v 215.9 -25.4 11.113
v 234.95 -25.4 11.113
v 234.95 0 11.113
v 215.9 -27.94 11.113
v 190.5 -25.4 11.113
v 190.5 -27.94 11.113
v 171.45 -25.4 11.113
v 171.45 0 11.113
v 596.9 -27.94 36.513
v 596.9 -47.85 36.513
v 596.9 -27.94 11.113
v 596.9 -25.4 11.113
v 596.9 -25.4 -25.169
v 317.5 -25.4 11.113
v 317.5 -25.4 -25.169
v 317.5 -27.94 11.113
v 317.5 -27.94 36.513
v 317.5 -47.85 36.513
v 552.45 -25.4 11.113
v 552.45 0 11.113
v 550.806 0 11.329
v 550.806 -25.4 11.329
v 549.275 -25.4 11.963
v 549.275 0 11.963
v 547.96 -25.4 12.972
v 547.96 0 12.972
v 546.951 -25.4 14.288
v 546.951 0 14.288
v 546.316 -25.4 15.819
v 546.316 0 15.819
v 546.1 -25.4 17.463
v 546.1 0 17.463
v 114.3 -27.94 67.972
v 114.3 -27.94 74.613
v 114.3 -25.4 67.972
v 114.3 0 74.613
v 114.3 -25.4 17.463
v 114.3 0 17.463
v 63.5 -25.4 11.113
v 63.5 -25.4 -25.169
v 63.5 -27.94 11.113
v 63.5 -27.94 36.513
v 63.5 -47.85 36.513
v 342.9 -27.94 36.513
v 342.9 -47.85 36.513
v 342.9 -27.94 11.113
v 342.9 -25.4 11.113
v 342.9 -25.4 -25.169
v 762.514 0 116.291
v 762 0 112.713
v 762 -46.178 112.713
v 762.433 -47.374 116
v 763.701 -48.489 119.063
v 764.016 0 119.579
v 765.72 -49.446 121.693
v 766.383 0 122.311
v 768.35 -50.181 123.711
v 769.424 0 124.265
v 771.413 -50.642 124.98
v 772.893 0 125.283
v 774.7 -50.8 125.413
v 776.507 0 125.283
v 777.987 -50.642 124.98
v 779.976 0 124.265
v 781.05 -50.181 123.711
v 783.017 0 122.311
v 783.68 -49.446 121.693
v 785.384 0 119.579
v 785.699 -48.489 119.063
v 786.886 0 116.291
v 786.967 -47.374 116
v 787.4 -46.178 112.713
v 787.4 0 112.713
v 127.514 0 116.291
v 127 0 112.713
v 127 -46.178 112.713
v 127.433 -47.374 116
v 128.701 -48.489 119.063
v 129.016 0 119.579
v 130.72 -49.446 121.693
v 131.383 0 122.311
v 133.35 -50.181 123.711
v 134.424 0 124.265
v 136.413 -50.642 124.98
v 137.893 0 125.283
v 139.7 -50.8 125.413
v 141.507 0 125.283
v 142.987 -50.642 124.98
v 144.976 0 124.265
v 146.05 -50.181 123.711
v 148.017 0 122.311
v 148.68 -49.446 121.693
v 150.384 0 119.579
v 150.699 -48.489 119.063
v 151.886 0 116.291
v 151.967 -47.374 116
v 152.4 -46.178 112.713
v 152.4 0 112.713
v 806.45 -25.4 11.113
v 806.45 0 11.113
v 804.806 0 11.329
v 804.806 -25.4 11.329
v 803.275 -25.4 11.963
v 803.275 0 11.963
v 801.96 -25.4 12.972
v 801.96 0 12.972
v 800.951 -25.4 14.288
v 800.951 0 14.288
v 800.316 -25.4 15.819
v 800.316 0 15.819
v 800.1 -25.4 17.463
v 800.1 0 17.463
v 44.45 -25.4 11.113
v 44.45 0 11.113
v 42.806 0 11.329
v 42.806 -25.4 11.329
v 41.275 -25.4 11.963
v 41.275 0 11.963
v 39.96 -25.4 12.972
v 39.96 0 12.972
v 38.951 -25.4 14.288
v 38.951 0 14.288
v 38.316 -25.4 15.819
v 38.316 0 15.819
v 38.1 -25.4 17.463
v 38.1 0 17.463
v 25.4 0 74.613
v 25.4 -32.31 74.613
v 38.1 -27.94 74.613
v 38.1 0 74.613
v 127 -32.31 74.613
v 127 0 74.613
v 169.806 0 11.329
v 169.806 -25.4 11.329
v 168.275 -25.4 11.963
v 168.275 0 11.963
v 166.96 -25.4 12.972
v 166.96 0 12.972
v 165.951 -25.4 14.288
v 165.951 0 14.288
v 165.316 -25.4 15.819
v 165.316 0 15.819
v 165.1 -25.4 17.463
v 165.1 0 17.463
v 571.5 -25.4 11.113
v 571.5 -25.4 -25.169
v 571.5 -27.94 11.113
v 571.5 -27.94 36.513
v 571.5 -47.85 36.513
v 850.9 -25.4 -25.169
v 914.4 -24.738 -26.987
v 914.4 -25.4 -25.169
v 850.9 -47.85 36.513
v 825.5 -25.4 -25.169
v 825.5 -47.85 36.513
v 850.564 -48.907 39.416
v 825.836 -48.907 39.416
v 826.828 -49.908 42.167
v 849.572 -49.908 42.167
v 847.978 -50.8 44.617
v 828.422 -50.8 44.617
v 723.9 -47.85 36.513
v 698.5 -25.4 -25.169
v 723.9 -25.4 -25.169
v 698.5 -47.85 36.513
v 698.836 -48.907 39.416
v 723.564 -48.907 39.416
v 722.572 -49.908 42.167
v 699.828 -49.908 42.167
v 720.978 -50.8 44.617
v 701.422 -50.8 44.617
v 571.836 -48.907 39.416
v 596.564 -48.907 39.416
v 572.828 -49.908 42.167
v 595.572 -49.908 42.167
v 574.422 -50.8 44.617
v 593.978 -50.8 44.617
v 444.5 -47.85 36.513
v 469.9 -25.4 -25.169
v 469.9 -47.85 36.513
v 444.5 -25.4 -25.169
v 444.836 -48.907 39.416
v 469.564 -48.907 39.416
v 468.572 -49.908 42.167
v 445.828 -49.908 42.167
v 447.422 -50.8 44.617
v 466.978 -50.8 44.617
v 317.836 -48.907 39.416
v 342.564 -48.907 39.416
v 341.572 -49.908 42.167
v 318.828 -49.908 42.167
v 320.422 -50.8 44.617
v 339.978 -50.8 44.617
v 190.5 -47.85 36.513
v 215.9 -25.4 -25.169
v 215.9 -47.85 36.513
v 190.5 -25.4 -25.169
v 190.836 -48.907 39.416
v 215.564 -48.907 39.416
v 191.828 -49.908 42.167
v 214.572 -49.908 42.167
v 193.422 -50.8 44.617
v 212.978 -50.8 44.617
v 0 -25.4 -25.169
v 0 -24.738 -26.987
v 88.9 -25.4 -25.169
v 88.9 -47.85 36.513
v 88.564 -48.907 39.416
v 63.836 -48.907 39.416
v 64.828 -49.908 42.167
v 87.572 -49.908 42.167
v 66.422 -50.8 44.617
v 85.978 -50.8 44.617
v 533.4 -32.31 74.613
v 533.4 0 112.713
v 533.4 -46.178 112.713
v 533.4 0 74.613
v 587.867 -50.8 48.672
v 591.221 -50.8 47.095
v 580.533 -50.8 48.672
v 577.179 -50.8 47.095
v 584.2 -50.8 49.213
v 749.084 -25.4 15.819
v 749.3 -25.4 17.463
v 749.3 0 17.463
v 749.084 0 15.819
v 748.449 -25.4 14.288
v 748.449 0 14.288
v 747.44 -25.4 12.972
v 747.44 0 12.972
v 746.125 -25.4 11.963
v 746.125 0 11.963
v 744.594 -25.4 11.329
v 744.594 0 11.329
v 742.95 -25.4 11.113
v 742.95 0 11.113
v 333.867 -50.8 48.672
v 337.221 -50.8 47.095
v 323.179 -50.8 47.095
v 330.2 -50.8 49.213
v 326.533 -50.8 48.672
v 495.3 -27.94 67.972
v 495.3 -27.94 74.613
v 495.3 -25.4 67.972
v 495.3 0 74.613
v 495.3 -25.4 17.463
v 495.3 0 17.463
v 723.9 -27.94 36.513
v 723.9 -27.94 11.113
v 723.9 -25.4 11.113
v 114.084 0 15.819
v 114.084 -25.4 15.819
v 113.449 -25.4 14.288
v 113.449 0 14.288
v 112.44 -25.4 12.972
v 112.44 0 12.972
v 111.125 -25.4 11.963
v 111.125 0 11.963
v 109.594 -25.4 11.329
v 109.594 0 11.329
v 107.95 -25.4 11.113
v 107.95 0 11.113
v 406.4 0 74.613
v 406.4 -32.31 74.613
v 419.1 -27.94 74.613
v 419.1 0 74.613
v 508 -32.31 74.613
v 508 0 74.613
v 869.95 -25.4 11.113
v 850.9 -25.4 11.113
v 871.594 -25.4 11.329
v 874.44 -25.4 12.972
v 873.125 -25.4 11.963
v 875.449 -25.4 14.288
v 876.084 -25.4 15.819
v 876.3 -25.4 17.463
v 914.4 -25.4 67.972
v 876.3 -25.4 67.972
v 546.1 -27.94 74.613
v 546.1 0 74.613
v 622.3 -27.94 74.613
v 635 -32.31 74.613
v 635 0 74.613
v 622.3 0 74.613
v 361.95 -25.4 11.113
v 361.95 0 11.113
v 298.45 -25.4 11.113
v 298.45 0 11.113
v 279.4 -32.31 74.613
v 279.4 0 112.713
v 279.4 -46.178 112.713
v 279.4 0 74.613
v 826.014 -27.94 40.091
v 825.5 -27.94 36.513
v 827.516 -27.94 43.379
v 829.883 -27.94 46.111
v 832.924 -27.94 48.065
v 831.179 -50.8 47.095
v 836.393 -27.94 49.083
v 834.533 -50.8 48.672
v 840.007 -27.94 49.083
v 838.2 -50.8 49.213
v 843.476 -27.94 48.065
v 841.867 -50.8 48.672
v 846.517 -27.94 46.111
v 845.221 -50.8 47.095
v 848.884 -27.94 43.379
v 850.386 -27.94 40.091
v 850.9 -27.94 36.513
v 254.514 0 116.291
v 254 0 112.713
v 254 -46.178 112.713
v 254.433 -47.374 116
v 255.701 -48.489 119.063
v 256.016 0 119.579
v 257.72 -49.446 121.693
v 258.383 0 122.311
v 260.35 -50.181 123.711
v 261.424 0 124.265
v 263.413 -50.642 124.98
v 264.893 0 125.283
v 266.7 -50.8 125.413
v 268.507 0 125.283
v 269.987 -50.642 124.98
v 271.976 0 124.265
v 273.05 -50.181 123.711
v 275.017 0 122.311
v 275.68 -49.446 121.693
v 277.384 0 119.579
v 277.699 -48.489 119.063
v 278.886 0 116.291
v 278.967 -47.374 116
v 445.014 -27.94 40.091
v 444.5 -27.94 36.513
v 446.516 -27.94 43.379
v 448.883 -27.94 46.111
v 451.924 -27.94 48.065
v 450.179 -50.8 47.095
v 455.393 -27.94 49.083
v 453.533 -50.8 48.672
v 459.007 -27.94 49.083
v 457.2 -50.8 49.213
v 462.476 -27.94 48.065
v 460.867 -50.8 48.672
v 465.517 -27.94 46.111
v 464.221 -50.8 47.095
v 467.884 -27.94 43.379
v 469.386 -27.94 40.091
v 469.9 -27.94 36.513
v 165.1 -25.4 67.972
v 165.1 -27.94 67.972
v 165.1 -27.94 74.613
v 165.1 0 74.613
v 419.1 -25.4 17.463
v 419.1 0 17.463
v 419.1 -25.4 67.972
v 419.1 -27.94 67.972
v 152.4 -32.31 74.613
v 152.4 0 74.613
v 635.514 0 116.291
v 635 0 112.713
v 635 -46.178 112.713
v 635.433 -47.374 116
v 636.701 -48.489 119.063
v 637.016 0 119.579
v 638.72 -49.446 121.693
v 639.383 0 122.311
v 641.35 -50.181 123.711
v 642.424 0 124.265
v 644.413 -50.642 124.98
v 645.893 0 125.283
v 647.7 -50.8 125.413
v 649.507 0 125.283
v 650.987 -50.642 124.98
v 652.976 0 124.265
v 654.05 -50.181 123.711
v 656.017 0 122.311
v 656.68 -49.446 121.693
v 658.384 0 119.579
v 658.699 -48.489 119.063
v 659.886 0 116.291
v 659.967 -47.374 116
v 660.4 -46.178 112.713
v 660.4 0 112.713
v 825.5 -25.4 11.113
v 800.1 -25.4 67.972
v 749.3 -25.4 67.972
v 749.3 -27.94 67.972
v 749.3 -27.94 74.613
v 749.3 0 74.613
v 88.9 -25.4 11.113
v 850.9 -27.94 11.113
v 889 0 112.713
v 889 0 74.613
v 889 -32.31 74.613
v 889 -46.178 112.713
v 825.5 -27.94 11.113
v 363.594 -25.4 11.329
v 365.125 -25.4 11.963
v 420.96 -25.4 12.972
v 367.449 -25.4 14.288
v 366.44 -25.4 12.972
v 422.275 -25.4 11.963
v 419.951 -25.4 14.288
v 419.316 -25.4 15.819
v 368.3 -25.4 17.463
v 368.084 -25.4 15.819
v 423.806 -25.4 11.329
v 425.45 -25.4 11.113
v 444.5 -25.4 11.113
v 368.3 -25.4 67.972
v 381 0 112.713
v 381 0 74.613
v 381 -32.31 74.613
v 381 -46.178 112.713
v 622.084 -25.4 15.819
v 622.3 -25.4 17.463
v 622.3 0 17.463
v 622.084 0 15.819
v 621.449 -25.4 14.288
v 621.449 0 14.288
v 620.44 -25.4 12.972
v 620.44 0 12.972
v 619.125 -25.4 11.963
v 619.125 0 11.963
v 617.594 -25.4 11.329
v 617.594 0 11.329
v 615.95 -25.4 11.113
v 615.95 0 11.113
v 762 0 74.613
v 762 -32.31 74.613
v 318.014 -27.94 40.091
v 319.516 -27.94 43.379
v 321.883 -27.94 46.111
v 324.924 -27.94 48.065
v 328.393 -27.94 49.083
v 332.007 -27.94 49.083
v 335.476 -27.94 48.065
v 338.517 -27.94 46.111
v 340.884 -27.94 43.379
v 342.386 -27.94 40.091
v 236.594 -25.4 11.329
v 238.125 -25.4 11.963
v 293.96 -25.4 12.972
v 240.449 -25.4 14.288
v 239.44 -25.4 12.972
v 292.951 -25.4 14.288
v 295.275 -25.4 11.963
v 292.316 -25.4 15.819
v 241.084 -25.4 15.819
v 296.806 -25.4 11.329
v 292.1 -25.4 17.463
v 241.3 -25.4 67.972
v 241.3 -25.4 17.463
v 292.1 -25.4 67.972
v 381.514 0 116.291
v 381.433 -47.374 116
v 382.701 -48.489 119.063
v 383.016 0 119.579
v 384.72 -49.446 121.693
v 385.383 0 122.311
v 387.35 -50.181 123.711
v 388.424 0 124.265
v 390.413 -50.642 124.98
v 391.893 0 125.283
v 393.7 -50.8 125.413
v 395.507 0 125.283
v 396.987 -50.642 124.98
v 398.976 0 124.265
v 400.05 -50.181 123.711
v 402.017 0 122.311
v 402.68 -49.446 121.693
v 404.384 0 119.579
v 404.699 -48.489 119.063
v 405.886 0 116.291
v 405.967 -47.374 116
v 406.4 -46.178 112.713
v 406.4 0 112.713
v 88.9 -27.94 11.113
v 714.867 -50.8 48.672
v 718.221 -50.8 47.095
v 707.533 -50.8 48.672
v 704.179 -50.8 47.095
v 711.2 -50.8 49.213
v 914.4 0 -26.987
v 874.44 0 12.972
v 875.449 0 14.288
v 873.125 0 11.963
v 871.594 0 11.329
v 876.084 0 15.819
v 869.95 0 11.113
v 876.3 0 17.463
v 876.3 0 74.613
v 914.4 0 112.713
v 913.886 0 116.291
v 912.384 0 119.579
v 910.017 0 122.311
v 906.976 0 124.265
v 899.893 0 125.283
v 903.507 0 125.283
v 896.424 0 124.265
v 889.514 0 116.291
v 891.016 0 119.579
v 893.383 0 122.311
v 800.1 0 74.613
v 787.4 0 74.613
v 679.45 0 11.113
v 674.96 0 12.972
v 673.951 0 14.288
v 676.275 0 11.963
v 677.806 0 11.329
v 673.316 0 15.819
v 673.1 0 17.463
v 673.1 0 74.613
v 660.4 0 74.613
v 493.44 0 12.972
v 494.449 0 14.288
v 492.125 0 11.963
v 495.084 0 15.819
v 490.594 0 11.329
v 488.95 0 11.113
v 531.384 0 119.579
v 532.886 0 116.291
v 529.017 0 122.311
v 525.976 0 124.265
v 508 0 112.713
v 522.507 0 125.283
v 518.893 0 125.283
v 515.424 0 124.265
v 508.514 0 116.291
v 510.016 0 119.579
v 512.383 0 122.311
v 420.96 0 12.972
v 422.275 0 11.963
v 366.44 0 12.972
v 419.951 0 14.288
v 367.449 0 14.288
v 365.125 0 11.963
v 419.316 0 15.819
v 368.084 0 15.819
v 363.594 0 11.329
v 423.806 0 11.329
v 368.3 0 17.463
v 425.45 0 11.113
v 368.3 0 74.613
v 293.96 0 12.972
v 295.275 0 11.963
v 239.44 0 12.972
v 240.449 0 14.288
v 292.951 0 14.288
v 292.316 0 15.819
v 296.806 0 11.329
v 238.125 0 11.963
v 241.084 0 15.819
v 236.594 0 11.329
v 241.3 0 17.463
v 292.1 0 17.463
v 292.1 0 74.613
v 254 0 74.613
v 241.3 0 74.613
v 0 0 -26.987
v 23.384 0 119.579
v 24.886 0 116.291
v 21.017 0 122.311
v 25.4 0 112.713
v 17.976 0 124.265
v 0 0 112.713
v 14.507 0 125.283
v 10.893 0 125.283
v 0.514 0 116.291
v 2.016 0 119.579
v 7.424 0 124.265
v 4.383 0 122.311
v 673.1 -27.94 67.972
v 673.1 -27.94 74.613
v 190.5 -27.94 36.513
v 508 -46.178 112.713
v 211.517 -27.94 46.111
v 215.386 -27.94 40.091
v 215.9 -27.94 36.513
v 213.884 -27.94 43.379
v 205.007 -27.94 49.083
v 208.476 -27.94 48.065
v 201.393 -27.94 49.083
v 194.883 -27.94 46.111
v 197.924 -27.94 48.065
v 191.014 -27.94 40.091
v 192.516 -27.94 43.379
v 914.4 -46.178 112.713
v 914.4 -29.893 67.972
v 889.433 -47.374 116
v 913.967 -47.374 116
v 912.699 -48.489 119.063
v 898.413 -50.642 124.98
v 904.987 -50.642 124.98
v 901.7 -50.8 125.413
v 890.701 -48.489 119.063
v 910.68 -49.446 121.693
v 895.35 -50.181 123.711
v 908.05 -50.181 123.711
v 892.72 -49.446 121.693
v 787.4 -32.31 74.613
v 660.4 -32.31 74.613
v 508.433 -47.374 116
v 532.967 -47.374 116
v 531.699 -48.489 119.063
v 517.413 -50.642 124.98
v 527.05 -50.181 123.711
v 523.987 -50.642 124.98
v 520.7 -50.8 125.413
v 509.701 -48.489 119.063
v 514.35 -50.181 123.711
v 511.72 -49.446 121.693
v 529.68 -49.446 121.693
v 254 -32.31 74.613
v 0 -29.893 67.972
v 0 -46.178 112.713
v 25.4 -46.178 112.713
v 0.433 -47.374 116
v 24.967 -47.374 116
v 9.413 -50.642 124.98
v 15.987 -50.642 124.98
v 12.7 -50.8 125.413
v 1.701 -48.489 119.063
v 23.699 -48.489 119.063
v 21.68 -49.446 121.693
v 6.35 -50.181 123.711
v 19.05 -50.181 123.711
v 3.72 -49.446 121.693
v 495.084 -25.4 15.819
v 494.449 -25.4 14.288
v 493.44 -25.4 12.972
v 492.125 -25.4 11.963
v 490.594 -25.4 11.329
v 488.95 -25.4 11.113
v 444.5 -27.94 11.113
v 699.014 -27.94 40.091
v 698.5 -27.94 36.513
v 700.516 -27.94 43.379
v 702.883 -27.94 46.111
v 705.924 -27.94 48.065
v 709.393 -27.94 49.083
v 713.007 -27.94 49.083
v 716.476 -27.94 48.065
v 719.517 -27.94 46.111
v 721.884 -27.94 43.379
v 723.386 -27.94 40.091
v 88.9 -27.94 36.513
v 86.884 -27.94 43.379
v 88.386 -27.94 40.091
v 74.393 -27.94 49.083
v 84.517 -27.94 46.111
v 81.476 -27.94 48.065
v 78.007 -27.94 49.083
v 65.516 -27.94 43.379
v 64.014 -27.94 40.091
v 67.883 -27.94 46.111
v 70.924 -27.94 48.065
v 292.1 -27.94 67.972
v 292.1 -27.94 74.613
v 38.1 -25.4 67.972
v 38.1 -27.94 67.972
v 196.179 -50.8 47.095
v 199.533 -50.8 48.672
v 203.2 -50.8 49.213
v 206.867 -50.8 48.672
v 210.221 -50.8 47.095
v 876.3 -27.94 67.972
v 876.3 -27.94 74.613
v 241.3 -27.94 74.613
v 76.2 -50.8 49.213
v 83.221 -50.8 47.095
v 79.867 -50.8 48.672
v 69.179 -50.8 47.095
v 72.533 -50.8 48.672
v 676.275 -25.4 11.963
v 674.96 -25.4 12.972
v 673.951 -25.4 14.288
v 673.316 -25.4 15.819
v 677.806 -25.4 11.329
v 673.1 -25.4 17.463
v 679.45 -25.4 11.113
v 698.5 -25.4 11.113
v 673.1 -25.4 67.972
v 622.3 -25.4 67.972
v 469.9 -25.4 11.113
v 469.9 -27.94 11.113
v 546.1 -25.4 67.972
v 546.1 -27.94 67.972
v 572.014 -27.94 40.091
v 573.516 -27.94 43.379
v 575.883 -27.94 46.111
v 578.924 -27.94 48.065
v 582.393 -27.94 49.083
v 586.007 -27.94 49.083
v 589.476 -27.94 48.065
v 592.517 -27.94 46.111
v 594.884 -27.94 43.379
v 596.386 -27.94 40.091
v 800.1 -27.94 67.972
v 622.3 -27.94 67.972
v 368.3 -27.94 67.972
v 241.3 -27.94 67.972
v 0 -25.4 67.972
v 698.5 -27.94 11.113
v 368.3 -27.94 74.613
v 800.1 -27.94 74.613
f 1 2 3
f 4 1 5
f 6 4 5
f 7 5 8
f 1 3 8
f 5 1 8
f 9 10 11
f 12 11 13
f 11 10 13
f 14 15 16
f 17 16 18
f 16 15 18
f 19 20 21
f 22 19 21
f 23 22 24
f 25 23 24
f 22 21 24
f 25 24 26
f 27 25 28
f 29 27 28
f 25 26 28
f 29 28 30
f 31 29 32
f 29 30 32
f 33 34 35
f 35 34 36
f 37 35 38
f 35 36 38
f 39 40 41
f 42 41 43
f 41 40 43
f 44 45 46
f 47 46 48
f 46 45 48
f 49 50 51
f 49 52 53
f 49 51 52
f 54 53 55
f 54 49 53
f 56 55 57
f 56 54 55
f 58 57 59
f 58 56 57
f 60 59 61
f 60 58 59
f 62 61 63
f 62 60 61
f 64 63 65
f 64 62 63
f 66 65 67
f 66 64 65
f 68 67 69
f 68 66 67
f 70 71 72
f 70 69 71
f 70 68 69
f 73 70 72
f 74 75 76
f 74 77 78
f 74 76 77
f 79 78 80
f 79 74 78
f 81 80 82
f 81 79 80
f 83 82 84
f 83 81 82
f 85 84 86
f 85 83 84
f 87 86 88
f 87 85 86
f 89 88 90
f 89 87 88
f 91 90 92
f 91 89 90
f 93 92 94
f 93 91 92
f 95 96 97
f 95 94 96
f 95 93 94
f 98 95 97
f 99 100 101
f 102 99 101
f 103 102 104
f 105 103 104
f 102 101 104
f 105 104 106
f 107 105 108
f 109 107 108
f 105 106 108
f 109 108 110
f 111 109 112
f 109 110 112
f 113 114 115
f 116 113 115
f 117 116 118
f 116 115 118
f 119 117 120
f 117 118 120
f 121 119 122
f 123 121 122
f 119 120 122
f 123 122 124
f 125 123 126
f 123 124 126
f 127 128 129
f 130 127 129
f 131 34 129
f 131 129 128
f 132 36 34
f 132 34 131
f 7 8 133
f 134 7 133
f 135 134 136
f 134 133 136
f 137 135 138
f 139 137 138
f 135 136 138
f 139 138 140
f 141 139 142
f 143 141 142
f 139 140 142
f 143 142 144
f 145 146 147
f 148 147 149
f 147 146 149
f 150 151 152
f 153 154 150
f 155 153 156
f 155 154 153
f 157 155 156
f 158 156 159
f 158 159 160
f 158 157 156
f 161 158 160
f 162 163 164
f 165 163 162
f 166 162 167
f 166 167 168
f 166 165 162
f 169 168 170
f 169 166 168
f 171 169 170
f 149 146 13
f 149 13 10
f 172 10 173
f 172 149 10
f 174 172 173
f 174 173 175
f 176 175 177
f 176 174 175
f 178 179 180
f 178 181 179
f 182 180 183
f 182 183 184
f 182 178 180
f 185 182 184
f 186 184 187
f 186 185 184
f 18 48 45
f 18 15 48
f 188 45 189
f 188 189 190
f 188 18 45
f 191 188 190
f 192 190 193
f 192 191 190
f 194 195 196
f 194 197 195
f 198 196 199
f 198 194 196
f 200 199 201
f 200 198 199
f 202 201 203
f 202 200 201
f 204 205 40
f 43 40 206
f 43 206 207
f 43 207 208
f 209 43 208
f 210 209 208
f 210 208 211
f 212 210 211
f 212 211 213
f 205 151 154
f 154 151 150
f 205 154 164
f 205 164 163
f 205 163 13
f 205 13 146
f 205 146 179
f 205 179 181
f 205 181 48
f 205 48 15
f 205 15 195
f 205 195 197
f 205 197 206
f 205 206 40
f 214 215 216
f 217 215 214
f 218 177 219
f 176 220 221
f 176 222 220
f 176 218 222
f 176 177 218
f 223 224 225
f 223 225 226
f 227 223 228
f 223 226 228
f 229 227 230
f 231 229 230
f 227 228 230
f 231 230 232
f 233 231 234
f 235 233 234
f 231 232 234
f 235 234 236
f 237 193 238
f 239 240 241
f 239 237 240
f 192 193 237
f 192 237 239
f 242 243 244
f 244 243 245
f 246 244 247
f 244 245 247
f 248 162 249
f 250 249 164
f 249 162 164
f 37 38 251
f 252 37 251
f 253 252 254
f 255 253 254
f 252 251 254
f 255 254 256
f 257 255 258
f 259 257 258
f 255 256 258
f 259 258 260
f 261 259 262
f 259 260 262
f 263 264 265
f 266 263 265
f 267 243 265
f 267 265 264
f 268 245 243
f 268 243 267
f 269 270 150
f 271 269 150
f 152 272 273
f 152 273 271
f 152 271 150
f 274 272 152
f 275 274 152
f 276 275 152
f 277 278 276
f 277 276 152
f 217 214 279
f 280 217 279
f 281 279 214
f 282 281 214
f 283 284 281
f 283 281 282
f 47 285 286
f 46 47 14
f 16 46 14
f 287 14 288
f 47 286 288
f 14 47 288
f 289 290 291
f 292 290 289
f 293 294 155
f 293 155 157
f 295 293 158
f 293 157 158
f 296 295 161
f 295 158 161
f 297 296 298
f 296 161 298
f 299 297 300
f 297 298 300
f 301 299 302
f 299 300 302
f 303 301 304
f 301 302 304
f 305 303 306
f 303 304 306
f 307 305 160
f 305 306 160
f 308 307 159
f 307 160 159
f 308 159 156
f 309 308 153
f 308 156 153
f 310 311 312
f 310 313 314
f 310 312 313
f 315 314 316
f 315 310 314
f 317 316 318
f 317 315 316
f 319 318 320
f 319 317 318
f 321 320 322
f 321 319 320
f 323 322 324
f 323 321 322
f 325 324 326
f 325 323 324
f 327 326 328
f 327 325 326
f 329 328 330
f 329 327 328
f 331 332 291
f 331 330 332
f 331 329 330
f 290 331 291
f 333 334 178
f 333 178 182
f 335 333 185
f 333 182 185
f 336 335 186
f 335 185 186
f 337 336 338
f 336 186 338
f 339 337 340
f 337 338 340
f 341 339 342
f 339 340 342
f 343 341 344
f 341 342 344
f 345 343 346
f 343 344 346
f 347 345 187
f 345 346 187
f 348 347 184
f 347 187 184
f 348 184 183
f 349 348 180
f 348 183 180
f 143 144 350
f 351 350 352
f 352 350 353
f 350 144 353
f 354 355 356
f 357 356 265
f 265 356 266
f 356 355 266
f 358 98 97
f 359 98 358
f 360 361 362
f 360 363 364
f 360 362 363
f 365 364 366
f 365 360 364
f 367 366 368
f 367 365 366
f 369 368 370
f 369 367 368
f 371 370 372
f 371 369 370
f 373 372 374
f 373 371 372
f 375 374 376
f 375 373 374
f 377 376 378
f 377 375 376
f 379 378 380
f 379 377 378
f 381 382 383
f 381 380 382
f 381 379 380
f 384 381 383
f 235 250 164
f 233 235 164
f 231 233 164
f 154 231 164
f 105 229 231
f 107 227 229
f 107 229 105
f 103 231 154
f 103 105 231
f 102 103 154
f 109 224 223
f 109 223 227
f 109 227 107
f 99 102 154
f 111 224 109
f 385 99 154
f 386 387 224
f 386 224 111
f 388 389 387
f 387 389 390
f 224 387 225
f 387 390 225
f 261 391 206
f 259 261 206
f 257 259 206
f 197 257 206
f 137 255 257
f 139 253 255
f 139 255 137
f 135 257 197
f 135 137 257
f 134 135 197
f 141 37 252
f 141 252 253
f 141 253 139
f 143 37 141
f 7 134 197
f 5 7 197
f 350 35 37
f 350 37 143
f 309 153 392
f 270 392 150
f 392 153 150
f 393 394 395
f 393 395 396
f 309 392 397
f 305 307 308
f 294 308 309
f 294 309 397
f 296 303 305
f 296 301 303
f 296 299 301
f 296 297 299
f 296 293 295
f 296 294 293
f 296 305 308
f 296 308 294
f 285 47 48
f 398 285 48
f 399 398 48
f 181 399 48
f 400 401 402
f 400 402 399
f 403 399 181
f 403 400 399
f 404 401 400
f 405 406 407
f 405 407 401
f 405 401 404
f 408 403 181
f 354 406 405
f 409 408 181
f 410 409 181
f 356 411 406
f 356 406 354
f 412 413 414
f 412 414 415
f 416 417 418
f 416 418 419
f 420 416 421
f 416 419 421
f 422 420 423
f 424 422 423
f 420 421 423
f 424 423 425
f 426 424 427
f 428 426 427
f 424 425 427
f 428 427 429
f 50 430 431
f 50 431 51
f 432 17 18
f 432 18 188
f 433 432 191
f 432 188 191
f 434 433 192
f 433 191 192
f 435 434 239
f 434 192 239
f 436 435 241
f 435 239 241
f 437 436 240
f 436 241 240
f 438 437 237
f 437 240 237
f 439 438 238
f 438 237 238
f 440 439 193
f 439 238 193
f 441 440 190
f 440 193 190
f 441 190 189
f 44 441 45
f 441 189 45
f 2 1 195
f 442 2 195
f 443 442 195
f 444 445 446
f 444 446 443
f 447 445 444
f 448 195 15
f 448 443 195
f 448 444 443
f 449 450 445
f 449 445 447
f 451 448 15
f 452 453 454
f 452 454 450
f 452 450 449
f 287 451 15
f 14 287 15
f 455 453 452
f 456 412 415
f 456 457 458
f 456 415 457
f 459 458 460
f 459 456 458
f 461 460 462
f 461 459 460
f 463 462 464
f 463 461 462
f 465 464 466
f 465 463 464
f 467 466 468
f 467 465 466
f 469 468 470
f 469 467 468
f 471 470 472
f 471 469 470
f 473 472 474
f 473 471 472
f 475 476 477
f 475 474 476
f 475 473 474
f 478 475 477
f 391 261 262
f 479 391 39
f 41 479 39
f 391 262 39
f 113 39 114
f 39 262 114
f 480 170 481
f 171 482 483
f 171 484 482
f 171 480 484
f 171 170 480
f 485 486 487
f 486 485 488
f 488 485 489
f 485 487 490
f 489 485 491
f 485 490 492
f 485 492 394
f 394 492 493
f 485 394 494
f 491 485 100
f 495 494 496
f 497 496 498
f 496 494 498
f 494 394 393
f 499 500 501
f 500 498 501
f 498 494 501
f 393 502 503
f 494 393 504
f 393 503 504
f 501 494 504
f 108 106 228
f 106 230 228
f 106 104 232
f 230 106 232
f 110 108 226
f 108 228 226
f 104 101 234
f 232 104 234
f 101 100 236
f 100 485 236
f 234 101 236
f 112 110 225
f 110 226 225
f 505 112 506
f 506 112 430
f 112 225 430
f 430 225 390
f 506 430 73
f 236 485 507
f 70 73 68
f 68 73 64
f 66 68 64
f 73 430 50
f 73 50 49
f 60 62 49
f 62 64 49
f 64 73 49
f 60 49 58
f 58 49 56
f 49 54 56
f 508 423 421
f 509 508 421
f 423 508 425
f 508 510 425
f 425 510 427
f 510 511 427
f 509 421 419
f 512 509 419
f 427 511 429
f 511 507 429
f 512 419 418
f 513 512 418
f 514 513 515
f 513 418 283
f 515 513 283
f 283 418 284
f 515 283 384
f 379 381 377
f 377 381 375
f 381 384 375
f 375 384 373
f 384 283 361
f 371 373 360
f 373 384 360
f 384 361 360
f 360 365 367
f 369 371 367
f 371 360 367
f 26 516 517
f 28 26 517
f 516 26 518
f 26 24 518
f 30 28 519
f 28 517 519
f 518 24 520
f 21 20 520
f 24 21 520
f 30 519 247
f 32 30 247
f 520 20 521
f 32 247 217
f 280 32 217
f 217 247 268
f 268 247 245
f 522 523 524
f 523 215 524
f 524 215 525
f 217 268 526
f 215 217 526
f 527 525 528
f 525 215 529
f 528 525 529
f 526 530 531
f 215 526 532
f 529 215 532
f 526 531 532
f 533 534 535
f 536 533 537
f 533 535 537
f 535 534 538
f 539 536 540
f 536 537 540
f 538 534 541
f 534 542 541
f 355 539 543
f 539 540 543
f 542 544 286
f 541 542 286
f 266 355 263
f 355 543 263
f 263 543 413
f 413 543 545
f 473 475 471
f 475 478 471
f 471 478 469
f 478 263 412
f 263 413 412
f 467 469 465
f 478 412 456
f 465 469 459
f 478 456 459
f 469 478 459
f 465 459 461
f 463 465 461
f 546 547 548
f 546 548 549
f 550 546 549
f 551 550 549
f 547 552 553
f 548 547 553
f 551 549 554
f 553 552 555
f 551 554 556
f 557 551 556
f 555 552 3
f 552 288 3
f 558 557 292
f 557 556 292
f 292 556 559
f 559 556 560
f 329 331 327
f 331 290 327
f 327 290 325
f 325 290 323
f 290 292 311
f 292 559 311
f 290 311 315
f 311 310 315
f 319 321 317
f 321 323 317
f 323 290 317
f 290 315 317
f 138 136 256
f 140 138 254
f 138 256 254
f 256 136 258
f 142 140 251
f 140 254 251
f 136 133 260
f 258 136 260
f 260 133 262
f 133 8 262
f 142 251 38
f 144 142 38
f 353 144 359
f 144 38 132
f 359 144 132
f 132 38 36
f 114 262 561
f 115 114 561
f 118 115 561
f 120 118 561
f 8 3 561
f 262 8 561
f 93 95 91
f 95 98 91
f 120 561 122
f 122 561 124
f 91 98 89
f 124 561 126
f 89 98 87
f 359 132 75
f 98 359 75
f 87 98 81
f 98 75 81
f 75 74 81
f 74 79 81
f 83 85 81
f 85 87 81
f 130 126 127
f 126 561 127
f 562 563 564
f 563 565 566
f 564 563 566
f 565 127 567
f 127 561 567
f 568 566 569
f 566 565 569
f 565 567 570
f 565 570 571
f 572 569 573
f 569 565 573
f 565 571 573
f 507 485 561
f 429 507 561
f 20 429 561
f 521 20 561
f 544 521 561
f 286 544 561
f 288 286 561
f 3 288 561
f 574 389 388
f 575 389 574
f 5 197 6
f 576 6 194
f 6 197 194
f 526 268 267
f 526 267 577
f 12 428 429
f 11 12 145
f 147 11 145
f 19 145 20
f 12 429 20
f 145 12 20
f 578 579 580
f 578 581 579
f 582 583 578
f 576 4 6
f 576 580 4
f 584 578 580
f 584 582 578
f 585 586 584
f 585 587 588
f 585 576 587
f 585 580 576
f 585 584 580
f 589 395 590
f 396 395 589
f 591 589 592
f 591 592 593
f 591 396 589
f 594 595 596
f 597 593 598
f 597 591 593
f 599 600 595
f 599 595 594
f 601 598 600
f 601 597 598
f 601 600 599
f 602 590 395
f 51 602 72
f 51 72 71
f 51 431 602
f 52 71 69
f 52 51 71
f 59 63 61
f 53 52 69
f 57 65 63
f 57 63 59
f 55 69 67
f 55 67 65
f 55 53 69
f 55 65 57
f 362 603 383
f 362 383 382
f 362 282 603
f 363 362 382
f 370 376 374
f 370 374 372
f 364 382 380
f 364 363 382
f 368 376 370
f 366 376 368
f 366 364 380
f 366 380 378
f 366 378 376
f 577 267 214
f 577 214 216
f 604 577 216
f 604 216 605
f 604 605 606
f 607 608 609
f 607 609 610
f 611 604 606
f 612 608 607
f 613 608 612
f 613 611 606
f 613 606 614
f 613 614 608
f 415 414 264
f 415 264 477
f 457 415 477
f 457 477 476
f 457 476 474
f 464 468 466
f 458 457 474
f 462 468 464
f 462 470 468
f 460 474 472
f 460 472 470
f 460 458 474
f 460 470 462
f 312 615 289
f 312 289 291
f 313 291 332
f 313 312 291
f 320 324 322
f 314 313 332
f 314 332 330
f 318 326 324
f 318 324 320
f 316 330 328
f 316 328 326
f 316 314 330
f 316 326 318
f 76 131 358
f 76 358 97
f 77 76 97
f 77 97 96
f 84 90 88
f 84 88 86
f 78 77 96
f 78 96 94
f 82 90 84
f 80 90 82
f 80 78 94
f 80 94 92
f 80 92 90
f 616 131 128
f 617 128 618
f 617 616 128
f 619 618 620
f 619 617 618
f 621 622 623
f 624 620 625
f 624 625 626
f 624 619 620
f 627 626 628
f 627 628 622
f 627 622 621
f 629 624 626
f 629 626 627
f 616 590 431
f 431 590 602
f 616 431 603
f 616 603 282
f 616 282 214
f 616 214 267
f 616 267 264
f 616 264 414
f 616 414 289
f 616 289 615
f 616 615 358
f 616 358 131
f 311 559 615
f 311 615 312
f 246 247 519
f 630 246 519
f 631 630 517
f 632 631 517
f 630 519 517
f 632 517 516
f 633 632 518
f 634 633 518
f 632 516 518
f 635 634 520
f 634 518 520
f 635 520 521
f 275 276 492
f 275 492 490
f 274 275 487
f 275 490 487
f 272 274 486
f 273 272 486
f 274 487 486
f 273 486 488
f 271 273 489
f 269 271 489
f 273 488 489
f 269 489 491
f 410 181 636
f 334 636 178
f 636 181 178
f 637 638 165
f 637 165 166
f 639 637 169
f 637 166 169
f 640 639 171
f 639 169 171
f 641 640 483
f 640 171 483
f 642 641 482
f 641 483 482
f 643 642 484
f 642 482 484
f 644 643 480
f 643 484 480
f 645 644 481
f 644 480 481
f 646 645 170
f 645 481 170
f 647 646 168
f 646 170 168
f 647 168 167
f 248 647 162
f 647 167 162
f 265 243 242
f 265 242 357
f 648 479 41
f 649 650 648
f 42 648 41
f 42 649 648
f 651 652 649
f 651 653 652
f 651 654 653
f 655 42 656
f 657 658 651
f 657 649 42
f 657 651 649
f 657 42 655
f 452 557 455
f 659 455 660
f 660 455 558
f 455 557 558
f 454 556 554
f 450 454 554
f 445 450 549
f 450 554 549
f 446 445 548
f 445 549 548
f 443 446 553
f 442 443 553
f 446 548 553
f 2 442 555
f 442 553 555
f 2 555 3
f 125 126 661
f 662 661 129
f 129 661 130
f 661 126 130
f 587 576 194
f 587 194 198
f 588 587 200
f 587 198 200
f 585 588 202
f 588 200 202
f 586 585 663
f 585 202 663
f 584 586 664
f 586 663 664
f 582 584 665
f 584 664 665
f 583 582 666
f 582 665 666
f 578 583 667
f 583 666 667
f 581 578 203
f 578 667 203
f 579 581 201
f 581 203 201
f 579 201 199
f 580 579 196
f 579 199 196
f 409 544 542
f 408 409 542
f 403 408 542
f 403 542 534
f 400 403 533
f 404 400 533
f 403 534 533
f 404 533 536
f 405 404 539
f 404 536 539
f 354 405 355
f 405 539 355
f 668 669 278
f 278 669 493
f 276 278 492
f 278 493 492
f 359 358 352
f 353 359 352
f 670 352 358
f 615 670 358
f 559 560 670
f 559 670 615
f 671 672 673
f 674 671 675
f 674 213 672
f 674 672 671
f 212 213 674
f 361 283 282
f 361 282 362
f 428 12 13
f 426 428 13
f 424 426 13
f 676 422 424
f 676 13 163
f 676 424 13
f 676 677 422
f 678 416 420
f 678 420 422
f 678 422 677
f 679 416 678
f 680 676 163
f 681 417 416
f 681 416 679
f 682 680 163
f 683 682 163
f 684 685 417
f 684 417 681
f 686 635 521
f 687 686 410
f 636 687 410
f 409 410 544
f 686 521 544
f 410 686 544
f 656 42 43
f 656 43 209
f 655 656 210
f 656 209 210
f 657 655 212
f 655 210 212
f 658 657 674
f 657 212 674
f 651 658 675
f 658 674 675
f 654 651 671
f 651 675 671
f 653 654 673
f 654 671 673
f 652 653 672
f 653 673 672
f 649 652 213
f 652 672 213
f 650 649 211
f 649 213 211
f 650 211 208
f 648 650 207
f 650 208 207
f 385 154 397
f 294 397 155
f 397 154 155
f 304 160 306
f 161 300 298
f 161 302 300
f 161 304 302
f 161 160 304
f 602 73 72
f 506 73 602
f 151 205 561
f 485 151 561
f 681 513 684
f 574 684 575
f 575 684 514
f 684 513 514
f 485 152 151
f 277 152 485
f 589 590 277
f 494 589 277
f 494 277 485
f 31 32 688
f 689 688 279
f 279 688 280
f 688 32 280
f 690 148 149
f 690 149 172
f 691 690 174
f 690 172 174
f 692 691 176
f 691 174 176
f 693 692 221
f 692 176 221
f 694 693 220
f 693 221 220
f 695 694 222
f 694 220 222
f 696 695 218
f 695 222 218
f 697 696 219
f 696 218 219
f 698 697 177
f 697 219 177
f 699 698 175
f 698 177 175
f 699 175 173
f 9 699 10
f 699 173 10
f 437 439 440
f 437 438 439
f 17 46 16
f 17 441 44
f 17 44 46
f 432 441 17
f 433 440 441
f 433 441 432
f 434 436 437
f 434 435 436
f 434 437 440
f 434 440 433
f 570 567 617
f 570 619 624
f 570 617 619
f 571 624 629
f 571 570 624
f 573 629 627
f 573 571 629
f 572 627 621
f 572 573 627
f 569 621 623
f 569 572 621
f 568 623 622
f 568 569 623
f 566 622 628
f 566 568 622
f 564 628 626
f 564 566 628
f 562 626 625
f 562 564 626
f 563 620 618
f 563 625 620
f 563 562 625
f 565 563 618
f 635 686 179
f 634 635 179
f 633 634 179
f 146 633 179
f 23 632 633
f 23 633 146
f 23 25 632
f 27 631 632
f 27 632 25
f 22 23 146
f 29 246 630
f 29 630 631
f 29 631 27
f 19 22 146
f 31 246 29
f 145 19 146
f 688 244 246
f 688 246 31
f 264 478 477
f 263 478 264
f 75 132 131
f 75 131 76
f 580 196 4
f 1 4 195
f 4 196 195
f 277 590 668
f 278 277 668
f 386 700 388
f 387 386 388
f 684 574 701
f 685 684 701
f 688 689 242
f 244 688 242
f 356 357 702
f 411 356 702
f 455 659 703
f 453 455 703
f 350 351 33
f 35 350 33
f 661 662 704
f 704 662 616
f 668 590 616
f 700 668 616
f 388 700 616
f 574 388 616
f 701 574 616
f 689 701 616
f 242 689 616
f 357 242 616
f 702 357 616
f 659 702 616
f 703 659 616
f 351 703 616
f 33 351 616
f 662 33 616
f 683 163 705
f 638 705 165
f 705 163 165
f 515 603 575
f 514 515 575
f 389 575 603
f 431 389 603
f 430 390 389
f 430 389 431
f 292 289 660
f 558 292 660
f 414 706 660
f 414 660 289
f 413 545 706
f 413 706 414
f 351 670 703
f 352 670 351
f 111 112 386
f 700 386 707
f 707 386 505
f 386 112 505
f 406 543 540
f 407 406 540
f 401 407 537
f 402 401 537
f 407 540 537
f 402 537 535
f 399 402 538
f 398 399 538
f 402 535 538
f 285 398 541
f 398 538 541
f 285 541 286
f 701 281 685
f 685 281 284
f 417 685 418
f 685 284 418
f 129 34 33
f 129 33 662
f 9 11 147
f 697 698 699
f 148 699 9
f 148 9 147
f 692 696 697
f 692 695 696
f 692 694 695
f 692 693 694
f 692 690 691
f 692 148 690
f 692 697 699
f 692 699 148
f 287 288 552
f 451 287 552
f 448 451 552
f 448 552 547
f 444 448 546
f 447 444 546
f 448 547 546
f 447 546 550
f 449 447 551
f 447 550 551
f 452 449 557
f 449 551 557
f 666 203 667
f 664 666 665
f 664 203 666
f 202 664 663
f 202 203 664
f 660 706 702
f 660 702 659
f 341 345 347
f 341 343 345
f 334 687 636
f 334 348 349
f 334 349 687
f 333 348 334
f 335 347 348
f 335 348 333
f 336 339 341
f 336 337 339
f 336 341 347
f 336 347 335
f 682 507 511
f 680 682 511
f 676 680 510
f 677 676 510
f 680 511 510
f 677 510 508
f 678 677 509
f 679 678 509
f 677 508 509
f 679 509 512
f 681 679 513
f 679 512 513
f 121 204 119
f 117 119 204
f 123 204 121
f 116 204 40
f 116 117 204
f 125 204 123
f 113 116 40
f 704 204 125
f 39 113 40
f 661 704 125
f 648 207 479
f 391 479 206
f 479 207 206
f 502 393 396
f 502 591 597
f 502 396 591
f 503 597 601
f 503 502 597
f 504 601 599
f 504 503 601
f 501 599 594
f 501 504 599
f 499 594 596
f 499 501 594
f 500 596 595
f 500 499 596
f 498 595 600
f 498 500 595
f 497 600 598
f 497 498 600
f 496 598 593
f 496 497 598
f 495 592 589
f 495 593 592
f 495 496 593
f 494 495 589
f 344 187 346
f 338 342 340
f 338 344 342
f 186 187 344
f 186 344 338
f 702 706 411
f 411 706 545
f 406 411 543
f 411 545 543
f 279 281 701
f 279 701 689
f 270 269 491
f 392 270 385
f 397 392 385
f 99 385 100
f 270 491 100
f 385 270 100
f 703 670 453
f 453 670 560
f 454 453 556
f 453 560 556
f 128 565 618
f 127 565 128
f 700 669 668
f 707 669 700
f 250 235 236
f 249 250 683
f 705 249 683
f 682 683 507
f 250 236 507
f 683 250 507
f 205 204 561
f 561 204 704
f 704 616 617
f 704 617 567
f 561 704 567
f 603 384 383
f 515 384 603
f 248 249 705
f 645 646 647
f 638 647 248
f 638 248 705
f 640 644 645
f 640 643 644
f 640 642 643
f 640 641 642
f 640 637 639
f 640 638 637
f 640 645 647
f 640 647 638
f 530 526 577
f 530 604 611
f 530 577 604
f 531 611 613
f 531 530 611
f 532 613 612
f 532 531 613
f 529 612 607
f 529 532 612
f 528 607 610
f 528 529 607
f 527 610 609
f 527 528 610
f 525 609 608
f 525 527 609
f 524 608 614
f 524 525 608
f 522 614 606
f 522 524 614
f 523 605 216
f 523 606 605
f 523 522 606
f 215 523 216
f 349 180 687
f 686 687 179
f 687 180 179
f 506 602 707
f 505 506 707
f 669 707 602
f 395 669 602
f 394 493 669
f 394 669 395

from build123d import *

# Parameters (mm, degrees)
F0_W      = 50.8
F0_H      = 152.4
F1_DEPTH  = 914.4
F3_DEPTH  = 25.4
F5_DEPTH  = 914.401
F7_DEPTH  = 914.401
F9_DEPTH  = 50.801
F11_DEPTH = 27.94


with BuildPart() as f1:
    # F0 (on Right) → F1 (new body)
    with BuildSketch(Plane.YZ):
        with Locations((-25.4, 49.212513)):
            Rectangle(F0_W, F0_H)
    extrude(amount=F1_DEPTH)

    # F2 (on face) → F3 (cut)
    with BuildSketch(Plane.XZ.offset(50.8)):
        with BuildLine():
            Line((-24.162216, -26.987487), (63.5, -26.987487))
            Line((63.5, -26.987487), (63.5, 36.512513))
            ThreePointArc((63.5, 36.512513), (76.2, 49.212513), (88.9, 36.512513))
            Line((88.9, 36.512513), (88.9, -26.987487))
            Line((88.9, -26.987487), (190.5, -26.987487))
            Line((190.5, -26.987487), (190.5, 36.512513))
            ThreePointArc((190.5, 36.512513), (203.2, 49.212513), (215.9, 36.512513))
            Line((215.9, 36.512513), (215.9, -26.987487))
            Line((215.9, -26.987487), (317.5, -26.987487))
            Line((317.5, -26.987487), (317.5, 36.512513))
            ThreePointArc((317.5, 36.512513), (330.2, 49.212513), (342.9, 36.512513))
            Line((342.9, 36.512513), (342.9, -26.987487))
            Line((342.9, -26.987487), (444.5, -26.987487))
            Line((444.5, -26.987487), (444.5, 36.512513))
            ThreePointArc((444.5, 36.512513), (457.2, 49.212513), (469.9, 36.512513))
            Line((469.9, 36.512513), (469.9, -26.987487))
            Line((469.9, -26.987487), (571.5, -26.987487))
            Line((571.5, -26.987487), (571.5, 36.512513))
            ThreePointArc((571.5, 36.512513), (584.2, 49.212513), (596.9, 36.512513))
            Line((596.9, 36.512513), (596.9, -26.987487))
            Line((596.9, -26.987487), (698.5, -26.987487))
            Line((698.5, -26.987487), (698.5, 36.512513))
            ThreePointArc((698.5, 36.512513), (711.2, 49.212513), (723.9, 36.512513))
            Line((723.9, 36.512513), (723.9, -26.987487))
            Line((723.9, -26.987487), (825.5, -26.987487))
            Line((825.5, -26.987487), (825.5, 36.512513))
            ThreePointArc((825.5, 36.512513), (838.2, 49.212513), (850.9, 36.512513))
            Line((850.9, 36.512513), (850.9, -26.987487))
            Line((850.9, -26.987487), (949.602742, -26.987487))
            Line((949.602742, -26.987487), (949.602742, 67.971823))
            Line((949.602742, 67.971823), (-24.162216, 67.971823))
            Line((-24.162216, 67.971823), (-24.162216, -26.987487))
        make_face()
    extrude(amount=-F3_DEPTH, mode=Mode.SUBTRACT)

    # F4 (on Right) → F5 (cut, through all)
    with BuildSketch(Plane.YZ):
        Polygon((-50.8, -26.987487), (-24.738065, -26.987487), (-50.8, 44.617091), align=None)
    extrude(amount=F5_DEPTH, mode=Mode.SUBTRACT)

    # F6 (on Right) → F7 (cut, through all)
    with BuildSketch(Plane.YZ):
        Polygon((-50.8, 65.742032), (-29.081721, 65.742032), (-50.8, 125.412513), align=None)
    extrude(amount=F7_DEPTH, mode=Mode.SUBTRACT)

    # F8 (on Front) → F9 (cut, through all)
    with BuildSketch(Plane.XZ):
        with BuildLine():
            Line((-17.833117, 74.612513), (0, 74.612513))
            Line((0, 74.612513), (0, 112.712513))
            ThreePointArc((0, 112.712513), (12.7, 125.412513), (25.4, 112.712513))
            Line((25.4, 112.712513), (25.4, 74.612513))
            Line((25.4, 74.612513), (127, 74.612513))
            Line((127, 74.612513), (127, 112.712513))
            ThreePointArc((127, 112.712513), (139.7, 125.412513), (152.4, 112.712513))
            Line((152.4, 112.712513), (152.4, 74.612513))
            Line((152.4, 74.612513), (254, 74.612513))
            Line((254, 74.612513), (254, 112.712513))
            ThreePointArc((254, 112.712513), (266.7, 125.412513), (279.4, 112.712513))
            Line((279.4, 112.712513), (279.4, 74.612513))
            Line((279.4, 74.612513), (381, 74.612513))
            Line((381, 74.612513), (381, 112.712513))
            ThreePointArc((381, 112.712513), (393.7, 125.412513), (406.4, 112.712513))
            Line((406.4, 112.712513), (406.4, 74.612513))
            Line((406.4, 74.612513), (508, 74.612513))
            Line((508, 74.612513), (508, 112.712513))
            ThreePointArc((508, 112.712513), (520.7, 125.412513), (533.4, 112.712513))
            Line((533.4, 112.712513), (533.4, 74.612513))
            Line((533.4, 74.612513), (635, 74.612513))
            Line((635, 74.612513), (635, 112.712513))
            ThreePointArc((635, 112.712513), (647.7, 125.412513), (660.4, 112.712513))
            Line((660.4, 112.712513), (660.4, 74.612513))
            Line((660.4, 74.612513), (762, 74.612513))
            Line((762, 74.612513), (762, 112.712513))
            ThreePointArc((762, 112.712513), (774.7, 125.412513), (787.4, 112.712513))
            Line((787.4, 112.712513), (787.4, 74.612513))
            Line((787.4, 74.612513), (889, 74.612513))
            Line((889, 74.612513), (889, 112.712513))
            ThreePointArc((889, 112.712513), (901.7, 125.412513), (914.4, 112.712513))
            Line((914.4, 112.712513), (914.4, 74.612513))
            Line((914.4, 74.612513), (957.003824, 74.612513))
            Line((957.003824, 74.612513), (957.003824, 229.980152))
            Line((957.003824, 229.980152), (-17.833117, 229.980152))
            Line((-17.833117, 229.980152), (-17.833117, 74.612513))
        make_face()
    extrude(amount=F9_DEPTH, mode=Mode.SUBTRACT)

    # F10 (on face) → F11 (cut)
    with BuildSketch(Plane(origin=(0, 0, 0), x_dir=(-1, 0, 0), z_dir=(0, 1, 0))):
        with BuildLine():
            Line((-806.45, 112.712513), (-869.95, 112.712513))
            ThreePointArc((-869.95, 112.712513), (-874.440128, 110.852641), (-876.3, 106.362513))
            Line((-876.3, 106.362513), (-876.3, 17.462513))
            ThreePointArc((-876.3, 17.462513), (-874.440128, 12.972385), (-869.95, 11.112513))
            Line((-869.95, 11.112513), (-806.45, 11.112513))
            ThreePointArc((-806.45, 11.112513), (-801.959872, 12.972385), (-800.1, 17.462513))
            Line((-800.1, 17.462513), (-800.1, 106.362513))
            ThreePointArc((-800.1, 106.362513), (-801.959872, 110.852641), (-806.45, 112.712513))
        make_face()
        with BuildLine():
            Line((-679.45, 112.712513), (-742.95, 112.712513))
            ThreePointArc((-742.95, 112.712513), (-747.440128, 110.852641), (-749.3, 106.362513))
            Line((-749.3, 106.362513), (-749.3, 17.462513))
            ThreePointArc((-749.3, 17.462513), (-747.440128, 12.972385), (-742.95, 11.112513))
            Line((-742.95, 11.112513), (-679.45, 11.112513))
            ThreePointArc((-679.45, 11.112513), (-674.959872, 12.972385), (-673.1, 17.462513))
            Line((-673.1, 17.462513), (-673.1, 106.362513))
            ThreePointArc((-673.1, 106.362513), (-674.959872, 110.852641), (-679.45, 112.712513))
        make_face()
        with BuildLine():
            Line((-552.45, 112.712513), (-615.95, 112.712513))
            ThreePointArc((-615.95, 112.712513), (-620.440128, 110.852641), (-622.3, 106.362513))
            Line((-622.3, 106.362513), (-622.3, 17.462513))
            ThreePointArc((-622.3, 17.462513), (-620.440128, 12.972385), (-615.95, 11.112513))
            Line((-615.95, 11.112513), (-552.45, 11.112513))
            ThreePointArc((-552.45, 11.112513), (-547.959872, 12.972385), (-546.1, 17.462513))
            Line((-546.1, 17.462513), (-546.1, 106.362513))
            ThreePointArc((-546.1, 106.362513), (-547.959872, 110.852641), (-552.45, 112.712513))
        make_face()
        with BuildLine():
            Line((-425.45, 112.712513), (-488.95, 112.712513))
            ThreePointArc((-488.95, 112.712513), (-493.440128, 110.852641), (-495.3, 106.362513))
            Line((-495.3, 106.362513), (-495.3, 17.462513))
            ThreePointArc((-495.3, 17.462513), (-493.440128, 12.972385), (-488.95, 11.112513))
            Line((-488.95, 11.112513), (-425.45, 11.112513))
            ThreePointArc((-425.45, 11.112513), (-420.959872, 12.972385), (-419.1, 17.462513))
            Line((-419.1, 17.462513), (-419.1, 106.362513))
            ThreePointArc((-419.1, 106.362513), (-420.959872, 110.852641), (-425.45, 112.712513))
        make_face()
        with BuildLine():
            Line((-298.45, 112.712513), (-361.95, 112.712513))
            ThreePointArc((-361.95, 112.712513), (-366.440128, 110.852641), (-368.3, 106.362513))
            Line((-368.3, 106.362513), (-368.3, 17.462513))
            ThreePointArc((-368.3, 17.462513), (-366.440128, 12.972385), (-361.95, 11.112513))
            Line((-361.95, 11.112513), (-298.45, 11.112513))
            ThreePointArc((-298.45, 11.112513), (-293.959872, 12.972385), (-292.1, 17.462513))
            Line((-292.1, 17.462513), (-292.1, 106.362513))
            ThreePointArc((-292.1, 106.362513), (-293.959872, 110.852641), (-298.45, 112.712513))
        make_face()
        with BuildLine():
            Line((-171.45, 112.712513), (-234.95, 112.712513))
            ThreePointArc((-234.95, 112.712513), (-239.440128, 110.852641), (-241.3, 106.362513))
            Line((-241.3, 106.362513), (-241.3, 17.462513))
            ThreePointArc((-241.3, 17.462513), (-239.440128, 12.972385), (-234.95, 11.112513))
            Line((-234.95, 11.112513), (-171.45, 11.112513))
            ThreePointArc((-171.45, 11.112513), (-166.959872, 12.972385), (-165.1, 17.462513))
            Line((-165.1, 17.462513), (-165.1, 106.362513))
            ThreePointArc((-165.1, 106.362513), (-166.959872, 110.852641), (-171.45, 112.712513))
        make_face()
        with BuildLine():
            Line((-44.45, 112.712513), (-107.95, 112.712513))
            ThreePointArc((-107.95, 112.712513), (-112.440128, 110.852641), (-114.3, 106.362513))
            Line((-114.3, 106.362513), (-114.3, 17.462513))
            ThreePointArc((-114.3, 17.462513), (-112.440128, 12.972385), (-107.95, 11.112513))
            Line((-107.95, 11.112513), (-44.45, 11.112513))
            ThreePointArc((-44.45, 11.112513), (-39.959872, 12.972385), (-38.1, 17.462513))
            Line((-38.1, 17.462513), (-38.1, 106.362513))
            ThreePointArc((-38.1, 106.362513), (-39.959872, 110.852641), (-44.45, 112.712513))
        make_face()
    extrude(amount=-F11_DEPTH, mode=Mode.SUBTRACT)


solid = f1.part
